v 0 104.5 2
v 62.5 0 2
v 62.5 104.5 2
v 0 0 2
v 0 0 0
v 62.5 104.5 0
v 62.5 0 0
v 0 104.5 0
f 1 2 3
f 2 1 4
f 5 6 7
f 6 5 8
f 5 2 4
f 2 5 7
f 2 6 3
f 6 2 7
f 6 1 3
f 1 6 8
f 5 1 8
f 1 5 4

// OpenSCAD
// file: constants.scad
// Sizes every part of a bin shares. Each file in modules/ includes this one, and the
// models include all of them, so it is included several times per render (as
// Gridfinity Extended's constants are): the case the app's include once is for.
grid_pitch = 42;
height_unit = 7;
clearance = 0.5;
wall = 1.2;
floor_thickness = 1.0;
corner_radius = 3.75;
base_height = 5;
lip_height = 2.4;
// main file
// A lid that sits on a bin. The sizes have no Customizer comment and a default
// that is a fraction: the app accepts them at their defaults.
include <constants.scad>

// Width in grid units
lid_width = 1.5;
// Depth in grid units
lid_depth = 2.5;
// Thickness in mm
thickness = 2; // [1:0.5:5]
// Put a finger notch on the front edge
notch = false;

x = lid_width * grid_pitch - clearance;
y = lid_depth * grid_pitch - clearance;
difference() {
    cube([x, y, thickness]);
    if (notch) translate([x / 2, 0, -1]) cylinder(r = 8, h = thickness + 2, $fn = 32);
}
